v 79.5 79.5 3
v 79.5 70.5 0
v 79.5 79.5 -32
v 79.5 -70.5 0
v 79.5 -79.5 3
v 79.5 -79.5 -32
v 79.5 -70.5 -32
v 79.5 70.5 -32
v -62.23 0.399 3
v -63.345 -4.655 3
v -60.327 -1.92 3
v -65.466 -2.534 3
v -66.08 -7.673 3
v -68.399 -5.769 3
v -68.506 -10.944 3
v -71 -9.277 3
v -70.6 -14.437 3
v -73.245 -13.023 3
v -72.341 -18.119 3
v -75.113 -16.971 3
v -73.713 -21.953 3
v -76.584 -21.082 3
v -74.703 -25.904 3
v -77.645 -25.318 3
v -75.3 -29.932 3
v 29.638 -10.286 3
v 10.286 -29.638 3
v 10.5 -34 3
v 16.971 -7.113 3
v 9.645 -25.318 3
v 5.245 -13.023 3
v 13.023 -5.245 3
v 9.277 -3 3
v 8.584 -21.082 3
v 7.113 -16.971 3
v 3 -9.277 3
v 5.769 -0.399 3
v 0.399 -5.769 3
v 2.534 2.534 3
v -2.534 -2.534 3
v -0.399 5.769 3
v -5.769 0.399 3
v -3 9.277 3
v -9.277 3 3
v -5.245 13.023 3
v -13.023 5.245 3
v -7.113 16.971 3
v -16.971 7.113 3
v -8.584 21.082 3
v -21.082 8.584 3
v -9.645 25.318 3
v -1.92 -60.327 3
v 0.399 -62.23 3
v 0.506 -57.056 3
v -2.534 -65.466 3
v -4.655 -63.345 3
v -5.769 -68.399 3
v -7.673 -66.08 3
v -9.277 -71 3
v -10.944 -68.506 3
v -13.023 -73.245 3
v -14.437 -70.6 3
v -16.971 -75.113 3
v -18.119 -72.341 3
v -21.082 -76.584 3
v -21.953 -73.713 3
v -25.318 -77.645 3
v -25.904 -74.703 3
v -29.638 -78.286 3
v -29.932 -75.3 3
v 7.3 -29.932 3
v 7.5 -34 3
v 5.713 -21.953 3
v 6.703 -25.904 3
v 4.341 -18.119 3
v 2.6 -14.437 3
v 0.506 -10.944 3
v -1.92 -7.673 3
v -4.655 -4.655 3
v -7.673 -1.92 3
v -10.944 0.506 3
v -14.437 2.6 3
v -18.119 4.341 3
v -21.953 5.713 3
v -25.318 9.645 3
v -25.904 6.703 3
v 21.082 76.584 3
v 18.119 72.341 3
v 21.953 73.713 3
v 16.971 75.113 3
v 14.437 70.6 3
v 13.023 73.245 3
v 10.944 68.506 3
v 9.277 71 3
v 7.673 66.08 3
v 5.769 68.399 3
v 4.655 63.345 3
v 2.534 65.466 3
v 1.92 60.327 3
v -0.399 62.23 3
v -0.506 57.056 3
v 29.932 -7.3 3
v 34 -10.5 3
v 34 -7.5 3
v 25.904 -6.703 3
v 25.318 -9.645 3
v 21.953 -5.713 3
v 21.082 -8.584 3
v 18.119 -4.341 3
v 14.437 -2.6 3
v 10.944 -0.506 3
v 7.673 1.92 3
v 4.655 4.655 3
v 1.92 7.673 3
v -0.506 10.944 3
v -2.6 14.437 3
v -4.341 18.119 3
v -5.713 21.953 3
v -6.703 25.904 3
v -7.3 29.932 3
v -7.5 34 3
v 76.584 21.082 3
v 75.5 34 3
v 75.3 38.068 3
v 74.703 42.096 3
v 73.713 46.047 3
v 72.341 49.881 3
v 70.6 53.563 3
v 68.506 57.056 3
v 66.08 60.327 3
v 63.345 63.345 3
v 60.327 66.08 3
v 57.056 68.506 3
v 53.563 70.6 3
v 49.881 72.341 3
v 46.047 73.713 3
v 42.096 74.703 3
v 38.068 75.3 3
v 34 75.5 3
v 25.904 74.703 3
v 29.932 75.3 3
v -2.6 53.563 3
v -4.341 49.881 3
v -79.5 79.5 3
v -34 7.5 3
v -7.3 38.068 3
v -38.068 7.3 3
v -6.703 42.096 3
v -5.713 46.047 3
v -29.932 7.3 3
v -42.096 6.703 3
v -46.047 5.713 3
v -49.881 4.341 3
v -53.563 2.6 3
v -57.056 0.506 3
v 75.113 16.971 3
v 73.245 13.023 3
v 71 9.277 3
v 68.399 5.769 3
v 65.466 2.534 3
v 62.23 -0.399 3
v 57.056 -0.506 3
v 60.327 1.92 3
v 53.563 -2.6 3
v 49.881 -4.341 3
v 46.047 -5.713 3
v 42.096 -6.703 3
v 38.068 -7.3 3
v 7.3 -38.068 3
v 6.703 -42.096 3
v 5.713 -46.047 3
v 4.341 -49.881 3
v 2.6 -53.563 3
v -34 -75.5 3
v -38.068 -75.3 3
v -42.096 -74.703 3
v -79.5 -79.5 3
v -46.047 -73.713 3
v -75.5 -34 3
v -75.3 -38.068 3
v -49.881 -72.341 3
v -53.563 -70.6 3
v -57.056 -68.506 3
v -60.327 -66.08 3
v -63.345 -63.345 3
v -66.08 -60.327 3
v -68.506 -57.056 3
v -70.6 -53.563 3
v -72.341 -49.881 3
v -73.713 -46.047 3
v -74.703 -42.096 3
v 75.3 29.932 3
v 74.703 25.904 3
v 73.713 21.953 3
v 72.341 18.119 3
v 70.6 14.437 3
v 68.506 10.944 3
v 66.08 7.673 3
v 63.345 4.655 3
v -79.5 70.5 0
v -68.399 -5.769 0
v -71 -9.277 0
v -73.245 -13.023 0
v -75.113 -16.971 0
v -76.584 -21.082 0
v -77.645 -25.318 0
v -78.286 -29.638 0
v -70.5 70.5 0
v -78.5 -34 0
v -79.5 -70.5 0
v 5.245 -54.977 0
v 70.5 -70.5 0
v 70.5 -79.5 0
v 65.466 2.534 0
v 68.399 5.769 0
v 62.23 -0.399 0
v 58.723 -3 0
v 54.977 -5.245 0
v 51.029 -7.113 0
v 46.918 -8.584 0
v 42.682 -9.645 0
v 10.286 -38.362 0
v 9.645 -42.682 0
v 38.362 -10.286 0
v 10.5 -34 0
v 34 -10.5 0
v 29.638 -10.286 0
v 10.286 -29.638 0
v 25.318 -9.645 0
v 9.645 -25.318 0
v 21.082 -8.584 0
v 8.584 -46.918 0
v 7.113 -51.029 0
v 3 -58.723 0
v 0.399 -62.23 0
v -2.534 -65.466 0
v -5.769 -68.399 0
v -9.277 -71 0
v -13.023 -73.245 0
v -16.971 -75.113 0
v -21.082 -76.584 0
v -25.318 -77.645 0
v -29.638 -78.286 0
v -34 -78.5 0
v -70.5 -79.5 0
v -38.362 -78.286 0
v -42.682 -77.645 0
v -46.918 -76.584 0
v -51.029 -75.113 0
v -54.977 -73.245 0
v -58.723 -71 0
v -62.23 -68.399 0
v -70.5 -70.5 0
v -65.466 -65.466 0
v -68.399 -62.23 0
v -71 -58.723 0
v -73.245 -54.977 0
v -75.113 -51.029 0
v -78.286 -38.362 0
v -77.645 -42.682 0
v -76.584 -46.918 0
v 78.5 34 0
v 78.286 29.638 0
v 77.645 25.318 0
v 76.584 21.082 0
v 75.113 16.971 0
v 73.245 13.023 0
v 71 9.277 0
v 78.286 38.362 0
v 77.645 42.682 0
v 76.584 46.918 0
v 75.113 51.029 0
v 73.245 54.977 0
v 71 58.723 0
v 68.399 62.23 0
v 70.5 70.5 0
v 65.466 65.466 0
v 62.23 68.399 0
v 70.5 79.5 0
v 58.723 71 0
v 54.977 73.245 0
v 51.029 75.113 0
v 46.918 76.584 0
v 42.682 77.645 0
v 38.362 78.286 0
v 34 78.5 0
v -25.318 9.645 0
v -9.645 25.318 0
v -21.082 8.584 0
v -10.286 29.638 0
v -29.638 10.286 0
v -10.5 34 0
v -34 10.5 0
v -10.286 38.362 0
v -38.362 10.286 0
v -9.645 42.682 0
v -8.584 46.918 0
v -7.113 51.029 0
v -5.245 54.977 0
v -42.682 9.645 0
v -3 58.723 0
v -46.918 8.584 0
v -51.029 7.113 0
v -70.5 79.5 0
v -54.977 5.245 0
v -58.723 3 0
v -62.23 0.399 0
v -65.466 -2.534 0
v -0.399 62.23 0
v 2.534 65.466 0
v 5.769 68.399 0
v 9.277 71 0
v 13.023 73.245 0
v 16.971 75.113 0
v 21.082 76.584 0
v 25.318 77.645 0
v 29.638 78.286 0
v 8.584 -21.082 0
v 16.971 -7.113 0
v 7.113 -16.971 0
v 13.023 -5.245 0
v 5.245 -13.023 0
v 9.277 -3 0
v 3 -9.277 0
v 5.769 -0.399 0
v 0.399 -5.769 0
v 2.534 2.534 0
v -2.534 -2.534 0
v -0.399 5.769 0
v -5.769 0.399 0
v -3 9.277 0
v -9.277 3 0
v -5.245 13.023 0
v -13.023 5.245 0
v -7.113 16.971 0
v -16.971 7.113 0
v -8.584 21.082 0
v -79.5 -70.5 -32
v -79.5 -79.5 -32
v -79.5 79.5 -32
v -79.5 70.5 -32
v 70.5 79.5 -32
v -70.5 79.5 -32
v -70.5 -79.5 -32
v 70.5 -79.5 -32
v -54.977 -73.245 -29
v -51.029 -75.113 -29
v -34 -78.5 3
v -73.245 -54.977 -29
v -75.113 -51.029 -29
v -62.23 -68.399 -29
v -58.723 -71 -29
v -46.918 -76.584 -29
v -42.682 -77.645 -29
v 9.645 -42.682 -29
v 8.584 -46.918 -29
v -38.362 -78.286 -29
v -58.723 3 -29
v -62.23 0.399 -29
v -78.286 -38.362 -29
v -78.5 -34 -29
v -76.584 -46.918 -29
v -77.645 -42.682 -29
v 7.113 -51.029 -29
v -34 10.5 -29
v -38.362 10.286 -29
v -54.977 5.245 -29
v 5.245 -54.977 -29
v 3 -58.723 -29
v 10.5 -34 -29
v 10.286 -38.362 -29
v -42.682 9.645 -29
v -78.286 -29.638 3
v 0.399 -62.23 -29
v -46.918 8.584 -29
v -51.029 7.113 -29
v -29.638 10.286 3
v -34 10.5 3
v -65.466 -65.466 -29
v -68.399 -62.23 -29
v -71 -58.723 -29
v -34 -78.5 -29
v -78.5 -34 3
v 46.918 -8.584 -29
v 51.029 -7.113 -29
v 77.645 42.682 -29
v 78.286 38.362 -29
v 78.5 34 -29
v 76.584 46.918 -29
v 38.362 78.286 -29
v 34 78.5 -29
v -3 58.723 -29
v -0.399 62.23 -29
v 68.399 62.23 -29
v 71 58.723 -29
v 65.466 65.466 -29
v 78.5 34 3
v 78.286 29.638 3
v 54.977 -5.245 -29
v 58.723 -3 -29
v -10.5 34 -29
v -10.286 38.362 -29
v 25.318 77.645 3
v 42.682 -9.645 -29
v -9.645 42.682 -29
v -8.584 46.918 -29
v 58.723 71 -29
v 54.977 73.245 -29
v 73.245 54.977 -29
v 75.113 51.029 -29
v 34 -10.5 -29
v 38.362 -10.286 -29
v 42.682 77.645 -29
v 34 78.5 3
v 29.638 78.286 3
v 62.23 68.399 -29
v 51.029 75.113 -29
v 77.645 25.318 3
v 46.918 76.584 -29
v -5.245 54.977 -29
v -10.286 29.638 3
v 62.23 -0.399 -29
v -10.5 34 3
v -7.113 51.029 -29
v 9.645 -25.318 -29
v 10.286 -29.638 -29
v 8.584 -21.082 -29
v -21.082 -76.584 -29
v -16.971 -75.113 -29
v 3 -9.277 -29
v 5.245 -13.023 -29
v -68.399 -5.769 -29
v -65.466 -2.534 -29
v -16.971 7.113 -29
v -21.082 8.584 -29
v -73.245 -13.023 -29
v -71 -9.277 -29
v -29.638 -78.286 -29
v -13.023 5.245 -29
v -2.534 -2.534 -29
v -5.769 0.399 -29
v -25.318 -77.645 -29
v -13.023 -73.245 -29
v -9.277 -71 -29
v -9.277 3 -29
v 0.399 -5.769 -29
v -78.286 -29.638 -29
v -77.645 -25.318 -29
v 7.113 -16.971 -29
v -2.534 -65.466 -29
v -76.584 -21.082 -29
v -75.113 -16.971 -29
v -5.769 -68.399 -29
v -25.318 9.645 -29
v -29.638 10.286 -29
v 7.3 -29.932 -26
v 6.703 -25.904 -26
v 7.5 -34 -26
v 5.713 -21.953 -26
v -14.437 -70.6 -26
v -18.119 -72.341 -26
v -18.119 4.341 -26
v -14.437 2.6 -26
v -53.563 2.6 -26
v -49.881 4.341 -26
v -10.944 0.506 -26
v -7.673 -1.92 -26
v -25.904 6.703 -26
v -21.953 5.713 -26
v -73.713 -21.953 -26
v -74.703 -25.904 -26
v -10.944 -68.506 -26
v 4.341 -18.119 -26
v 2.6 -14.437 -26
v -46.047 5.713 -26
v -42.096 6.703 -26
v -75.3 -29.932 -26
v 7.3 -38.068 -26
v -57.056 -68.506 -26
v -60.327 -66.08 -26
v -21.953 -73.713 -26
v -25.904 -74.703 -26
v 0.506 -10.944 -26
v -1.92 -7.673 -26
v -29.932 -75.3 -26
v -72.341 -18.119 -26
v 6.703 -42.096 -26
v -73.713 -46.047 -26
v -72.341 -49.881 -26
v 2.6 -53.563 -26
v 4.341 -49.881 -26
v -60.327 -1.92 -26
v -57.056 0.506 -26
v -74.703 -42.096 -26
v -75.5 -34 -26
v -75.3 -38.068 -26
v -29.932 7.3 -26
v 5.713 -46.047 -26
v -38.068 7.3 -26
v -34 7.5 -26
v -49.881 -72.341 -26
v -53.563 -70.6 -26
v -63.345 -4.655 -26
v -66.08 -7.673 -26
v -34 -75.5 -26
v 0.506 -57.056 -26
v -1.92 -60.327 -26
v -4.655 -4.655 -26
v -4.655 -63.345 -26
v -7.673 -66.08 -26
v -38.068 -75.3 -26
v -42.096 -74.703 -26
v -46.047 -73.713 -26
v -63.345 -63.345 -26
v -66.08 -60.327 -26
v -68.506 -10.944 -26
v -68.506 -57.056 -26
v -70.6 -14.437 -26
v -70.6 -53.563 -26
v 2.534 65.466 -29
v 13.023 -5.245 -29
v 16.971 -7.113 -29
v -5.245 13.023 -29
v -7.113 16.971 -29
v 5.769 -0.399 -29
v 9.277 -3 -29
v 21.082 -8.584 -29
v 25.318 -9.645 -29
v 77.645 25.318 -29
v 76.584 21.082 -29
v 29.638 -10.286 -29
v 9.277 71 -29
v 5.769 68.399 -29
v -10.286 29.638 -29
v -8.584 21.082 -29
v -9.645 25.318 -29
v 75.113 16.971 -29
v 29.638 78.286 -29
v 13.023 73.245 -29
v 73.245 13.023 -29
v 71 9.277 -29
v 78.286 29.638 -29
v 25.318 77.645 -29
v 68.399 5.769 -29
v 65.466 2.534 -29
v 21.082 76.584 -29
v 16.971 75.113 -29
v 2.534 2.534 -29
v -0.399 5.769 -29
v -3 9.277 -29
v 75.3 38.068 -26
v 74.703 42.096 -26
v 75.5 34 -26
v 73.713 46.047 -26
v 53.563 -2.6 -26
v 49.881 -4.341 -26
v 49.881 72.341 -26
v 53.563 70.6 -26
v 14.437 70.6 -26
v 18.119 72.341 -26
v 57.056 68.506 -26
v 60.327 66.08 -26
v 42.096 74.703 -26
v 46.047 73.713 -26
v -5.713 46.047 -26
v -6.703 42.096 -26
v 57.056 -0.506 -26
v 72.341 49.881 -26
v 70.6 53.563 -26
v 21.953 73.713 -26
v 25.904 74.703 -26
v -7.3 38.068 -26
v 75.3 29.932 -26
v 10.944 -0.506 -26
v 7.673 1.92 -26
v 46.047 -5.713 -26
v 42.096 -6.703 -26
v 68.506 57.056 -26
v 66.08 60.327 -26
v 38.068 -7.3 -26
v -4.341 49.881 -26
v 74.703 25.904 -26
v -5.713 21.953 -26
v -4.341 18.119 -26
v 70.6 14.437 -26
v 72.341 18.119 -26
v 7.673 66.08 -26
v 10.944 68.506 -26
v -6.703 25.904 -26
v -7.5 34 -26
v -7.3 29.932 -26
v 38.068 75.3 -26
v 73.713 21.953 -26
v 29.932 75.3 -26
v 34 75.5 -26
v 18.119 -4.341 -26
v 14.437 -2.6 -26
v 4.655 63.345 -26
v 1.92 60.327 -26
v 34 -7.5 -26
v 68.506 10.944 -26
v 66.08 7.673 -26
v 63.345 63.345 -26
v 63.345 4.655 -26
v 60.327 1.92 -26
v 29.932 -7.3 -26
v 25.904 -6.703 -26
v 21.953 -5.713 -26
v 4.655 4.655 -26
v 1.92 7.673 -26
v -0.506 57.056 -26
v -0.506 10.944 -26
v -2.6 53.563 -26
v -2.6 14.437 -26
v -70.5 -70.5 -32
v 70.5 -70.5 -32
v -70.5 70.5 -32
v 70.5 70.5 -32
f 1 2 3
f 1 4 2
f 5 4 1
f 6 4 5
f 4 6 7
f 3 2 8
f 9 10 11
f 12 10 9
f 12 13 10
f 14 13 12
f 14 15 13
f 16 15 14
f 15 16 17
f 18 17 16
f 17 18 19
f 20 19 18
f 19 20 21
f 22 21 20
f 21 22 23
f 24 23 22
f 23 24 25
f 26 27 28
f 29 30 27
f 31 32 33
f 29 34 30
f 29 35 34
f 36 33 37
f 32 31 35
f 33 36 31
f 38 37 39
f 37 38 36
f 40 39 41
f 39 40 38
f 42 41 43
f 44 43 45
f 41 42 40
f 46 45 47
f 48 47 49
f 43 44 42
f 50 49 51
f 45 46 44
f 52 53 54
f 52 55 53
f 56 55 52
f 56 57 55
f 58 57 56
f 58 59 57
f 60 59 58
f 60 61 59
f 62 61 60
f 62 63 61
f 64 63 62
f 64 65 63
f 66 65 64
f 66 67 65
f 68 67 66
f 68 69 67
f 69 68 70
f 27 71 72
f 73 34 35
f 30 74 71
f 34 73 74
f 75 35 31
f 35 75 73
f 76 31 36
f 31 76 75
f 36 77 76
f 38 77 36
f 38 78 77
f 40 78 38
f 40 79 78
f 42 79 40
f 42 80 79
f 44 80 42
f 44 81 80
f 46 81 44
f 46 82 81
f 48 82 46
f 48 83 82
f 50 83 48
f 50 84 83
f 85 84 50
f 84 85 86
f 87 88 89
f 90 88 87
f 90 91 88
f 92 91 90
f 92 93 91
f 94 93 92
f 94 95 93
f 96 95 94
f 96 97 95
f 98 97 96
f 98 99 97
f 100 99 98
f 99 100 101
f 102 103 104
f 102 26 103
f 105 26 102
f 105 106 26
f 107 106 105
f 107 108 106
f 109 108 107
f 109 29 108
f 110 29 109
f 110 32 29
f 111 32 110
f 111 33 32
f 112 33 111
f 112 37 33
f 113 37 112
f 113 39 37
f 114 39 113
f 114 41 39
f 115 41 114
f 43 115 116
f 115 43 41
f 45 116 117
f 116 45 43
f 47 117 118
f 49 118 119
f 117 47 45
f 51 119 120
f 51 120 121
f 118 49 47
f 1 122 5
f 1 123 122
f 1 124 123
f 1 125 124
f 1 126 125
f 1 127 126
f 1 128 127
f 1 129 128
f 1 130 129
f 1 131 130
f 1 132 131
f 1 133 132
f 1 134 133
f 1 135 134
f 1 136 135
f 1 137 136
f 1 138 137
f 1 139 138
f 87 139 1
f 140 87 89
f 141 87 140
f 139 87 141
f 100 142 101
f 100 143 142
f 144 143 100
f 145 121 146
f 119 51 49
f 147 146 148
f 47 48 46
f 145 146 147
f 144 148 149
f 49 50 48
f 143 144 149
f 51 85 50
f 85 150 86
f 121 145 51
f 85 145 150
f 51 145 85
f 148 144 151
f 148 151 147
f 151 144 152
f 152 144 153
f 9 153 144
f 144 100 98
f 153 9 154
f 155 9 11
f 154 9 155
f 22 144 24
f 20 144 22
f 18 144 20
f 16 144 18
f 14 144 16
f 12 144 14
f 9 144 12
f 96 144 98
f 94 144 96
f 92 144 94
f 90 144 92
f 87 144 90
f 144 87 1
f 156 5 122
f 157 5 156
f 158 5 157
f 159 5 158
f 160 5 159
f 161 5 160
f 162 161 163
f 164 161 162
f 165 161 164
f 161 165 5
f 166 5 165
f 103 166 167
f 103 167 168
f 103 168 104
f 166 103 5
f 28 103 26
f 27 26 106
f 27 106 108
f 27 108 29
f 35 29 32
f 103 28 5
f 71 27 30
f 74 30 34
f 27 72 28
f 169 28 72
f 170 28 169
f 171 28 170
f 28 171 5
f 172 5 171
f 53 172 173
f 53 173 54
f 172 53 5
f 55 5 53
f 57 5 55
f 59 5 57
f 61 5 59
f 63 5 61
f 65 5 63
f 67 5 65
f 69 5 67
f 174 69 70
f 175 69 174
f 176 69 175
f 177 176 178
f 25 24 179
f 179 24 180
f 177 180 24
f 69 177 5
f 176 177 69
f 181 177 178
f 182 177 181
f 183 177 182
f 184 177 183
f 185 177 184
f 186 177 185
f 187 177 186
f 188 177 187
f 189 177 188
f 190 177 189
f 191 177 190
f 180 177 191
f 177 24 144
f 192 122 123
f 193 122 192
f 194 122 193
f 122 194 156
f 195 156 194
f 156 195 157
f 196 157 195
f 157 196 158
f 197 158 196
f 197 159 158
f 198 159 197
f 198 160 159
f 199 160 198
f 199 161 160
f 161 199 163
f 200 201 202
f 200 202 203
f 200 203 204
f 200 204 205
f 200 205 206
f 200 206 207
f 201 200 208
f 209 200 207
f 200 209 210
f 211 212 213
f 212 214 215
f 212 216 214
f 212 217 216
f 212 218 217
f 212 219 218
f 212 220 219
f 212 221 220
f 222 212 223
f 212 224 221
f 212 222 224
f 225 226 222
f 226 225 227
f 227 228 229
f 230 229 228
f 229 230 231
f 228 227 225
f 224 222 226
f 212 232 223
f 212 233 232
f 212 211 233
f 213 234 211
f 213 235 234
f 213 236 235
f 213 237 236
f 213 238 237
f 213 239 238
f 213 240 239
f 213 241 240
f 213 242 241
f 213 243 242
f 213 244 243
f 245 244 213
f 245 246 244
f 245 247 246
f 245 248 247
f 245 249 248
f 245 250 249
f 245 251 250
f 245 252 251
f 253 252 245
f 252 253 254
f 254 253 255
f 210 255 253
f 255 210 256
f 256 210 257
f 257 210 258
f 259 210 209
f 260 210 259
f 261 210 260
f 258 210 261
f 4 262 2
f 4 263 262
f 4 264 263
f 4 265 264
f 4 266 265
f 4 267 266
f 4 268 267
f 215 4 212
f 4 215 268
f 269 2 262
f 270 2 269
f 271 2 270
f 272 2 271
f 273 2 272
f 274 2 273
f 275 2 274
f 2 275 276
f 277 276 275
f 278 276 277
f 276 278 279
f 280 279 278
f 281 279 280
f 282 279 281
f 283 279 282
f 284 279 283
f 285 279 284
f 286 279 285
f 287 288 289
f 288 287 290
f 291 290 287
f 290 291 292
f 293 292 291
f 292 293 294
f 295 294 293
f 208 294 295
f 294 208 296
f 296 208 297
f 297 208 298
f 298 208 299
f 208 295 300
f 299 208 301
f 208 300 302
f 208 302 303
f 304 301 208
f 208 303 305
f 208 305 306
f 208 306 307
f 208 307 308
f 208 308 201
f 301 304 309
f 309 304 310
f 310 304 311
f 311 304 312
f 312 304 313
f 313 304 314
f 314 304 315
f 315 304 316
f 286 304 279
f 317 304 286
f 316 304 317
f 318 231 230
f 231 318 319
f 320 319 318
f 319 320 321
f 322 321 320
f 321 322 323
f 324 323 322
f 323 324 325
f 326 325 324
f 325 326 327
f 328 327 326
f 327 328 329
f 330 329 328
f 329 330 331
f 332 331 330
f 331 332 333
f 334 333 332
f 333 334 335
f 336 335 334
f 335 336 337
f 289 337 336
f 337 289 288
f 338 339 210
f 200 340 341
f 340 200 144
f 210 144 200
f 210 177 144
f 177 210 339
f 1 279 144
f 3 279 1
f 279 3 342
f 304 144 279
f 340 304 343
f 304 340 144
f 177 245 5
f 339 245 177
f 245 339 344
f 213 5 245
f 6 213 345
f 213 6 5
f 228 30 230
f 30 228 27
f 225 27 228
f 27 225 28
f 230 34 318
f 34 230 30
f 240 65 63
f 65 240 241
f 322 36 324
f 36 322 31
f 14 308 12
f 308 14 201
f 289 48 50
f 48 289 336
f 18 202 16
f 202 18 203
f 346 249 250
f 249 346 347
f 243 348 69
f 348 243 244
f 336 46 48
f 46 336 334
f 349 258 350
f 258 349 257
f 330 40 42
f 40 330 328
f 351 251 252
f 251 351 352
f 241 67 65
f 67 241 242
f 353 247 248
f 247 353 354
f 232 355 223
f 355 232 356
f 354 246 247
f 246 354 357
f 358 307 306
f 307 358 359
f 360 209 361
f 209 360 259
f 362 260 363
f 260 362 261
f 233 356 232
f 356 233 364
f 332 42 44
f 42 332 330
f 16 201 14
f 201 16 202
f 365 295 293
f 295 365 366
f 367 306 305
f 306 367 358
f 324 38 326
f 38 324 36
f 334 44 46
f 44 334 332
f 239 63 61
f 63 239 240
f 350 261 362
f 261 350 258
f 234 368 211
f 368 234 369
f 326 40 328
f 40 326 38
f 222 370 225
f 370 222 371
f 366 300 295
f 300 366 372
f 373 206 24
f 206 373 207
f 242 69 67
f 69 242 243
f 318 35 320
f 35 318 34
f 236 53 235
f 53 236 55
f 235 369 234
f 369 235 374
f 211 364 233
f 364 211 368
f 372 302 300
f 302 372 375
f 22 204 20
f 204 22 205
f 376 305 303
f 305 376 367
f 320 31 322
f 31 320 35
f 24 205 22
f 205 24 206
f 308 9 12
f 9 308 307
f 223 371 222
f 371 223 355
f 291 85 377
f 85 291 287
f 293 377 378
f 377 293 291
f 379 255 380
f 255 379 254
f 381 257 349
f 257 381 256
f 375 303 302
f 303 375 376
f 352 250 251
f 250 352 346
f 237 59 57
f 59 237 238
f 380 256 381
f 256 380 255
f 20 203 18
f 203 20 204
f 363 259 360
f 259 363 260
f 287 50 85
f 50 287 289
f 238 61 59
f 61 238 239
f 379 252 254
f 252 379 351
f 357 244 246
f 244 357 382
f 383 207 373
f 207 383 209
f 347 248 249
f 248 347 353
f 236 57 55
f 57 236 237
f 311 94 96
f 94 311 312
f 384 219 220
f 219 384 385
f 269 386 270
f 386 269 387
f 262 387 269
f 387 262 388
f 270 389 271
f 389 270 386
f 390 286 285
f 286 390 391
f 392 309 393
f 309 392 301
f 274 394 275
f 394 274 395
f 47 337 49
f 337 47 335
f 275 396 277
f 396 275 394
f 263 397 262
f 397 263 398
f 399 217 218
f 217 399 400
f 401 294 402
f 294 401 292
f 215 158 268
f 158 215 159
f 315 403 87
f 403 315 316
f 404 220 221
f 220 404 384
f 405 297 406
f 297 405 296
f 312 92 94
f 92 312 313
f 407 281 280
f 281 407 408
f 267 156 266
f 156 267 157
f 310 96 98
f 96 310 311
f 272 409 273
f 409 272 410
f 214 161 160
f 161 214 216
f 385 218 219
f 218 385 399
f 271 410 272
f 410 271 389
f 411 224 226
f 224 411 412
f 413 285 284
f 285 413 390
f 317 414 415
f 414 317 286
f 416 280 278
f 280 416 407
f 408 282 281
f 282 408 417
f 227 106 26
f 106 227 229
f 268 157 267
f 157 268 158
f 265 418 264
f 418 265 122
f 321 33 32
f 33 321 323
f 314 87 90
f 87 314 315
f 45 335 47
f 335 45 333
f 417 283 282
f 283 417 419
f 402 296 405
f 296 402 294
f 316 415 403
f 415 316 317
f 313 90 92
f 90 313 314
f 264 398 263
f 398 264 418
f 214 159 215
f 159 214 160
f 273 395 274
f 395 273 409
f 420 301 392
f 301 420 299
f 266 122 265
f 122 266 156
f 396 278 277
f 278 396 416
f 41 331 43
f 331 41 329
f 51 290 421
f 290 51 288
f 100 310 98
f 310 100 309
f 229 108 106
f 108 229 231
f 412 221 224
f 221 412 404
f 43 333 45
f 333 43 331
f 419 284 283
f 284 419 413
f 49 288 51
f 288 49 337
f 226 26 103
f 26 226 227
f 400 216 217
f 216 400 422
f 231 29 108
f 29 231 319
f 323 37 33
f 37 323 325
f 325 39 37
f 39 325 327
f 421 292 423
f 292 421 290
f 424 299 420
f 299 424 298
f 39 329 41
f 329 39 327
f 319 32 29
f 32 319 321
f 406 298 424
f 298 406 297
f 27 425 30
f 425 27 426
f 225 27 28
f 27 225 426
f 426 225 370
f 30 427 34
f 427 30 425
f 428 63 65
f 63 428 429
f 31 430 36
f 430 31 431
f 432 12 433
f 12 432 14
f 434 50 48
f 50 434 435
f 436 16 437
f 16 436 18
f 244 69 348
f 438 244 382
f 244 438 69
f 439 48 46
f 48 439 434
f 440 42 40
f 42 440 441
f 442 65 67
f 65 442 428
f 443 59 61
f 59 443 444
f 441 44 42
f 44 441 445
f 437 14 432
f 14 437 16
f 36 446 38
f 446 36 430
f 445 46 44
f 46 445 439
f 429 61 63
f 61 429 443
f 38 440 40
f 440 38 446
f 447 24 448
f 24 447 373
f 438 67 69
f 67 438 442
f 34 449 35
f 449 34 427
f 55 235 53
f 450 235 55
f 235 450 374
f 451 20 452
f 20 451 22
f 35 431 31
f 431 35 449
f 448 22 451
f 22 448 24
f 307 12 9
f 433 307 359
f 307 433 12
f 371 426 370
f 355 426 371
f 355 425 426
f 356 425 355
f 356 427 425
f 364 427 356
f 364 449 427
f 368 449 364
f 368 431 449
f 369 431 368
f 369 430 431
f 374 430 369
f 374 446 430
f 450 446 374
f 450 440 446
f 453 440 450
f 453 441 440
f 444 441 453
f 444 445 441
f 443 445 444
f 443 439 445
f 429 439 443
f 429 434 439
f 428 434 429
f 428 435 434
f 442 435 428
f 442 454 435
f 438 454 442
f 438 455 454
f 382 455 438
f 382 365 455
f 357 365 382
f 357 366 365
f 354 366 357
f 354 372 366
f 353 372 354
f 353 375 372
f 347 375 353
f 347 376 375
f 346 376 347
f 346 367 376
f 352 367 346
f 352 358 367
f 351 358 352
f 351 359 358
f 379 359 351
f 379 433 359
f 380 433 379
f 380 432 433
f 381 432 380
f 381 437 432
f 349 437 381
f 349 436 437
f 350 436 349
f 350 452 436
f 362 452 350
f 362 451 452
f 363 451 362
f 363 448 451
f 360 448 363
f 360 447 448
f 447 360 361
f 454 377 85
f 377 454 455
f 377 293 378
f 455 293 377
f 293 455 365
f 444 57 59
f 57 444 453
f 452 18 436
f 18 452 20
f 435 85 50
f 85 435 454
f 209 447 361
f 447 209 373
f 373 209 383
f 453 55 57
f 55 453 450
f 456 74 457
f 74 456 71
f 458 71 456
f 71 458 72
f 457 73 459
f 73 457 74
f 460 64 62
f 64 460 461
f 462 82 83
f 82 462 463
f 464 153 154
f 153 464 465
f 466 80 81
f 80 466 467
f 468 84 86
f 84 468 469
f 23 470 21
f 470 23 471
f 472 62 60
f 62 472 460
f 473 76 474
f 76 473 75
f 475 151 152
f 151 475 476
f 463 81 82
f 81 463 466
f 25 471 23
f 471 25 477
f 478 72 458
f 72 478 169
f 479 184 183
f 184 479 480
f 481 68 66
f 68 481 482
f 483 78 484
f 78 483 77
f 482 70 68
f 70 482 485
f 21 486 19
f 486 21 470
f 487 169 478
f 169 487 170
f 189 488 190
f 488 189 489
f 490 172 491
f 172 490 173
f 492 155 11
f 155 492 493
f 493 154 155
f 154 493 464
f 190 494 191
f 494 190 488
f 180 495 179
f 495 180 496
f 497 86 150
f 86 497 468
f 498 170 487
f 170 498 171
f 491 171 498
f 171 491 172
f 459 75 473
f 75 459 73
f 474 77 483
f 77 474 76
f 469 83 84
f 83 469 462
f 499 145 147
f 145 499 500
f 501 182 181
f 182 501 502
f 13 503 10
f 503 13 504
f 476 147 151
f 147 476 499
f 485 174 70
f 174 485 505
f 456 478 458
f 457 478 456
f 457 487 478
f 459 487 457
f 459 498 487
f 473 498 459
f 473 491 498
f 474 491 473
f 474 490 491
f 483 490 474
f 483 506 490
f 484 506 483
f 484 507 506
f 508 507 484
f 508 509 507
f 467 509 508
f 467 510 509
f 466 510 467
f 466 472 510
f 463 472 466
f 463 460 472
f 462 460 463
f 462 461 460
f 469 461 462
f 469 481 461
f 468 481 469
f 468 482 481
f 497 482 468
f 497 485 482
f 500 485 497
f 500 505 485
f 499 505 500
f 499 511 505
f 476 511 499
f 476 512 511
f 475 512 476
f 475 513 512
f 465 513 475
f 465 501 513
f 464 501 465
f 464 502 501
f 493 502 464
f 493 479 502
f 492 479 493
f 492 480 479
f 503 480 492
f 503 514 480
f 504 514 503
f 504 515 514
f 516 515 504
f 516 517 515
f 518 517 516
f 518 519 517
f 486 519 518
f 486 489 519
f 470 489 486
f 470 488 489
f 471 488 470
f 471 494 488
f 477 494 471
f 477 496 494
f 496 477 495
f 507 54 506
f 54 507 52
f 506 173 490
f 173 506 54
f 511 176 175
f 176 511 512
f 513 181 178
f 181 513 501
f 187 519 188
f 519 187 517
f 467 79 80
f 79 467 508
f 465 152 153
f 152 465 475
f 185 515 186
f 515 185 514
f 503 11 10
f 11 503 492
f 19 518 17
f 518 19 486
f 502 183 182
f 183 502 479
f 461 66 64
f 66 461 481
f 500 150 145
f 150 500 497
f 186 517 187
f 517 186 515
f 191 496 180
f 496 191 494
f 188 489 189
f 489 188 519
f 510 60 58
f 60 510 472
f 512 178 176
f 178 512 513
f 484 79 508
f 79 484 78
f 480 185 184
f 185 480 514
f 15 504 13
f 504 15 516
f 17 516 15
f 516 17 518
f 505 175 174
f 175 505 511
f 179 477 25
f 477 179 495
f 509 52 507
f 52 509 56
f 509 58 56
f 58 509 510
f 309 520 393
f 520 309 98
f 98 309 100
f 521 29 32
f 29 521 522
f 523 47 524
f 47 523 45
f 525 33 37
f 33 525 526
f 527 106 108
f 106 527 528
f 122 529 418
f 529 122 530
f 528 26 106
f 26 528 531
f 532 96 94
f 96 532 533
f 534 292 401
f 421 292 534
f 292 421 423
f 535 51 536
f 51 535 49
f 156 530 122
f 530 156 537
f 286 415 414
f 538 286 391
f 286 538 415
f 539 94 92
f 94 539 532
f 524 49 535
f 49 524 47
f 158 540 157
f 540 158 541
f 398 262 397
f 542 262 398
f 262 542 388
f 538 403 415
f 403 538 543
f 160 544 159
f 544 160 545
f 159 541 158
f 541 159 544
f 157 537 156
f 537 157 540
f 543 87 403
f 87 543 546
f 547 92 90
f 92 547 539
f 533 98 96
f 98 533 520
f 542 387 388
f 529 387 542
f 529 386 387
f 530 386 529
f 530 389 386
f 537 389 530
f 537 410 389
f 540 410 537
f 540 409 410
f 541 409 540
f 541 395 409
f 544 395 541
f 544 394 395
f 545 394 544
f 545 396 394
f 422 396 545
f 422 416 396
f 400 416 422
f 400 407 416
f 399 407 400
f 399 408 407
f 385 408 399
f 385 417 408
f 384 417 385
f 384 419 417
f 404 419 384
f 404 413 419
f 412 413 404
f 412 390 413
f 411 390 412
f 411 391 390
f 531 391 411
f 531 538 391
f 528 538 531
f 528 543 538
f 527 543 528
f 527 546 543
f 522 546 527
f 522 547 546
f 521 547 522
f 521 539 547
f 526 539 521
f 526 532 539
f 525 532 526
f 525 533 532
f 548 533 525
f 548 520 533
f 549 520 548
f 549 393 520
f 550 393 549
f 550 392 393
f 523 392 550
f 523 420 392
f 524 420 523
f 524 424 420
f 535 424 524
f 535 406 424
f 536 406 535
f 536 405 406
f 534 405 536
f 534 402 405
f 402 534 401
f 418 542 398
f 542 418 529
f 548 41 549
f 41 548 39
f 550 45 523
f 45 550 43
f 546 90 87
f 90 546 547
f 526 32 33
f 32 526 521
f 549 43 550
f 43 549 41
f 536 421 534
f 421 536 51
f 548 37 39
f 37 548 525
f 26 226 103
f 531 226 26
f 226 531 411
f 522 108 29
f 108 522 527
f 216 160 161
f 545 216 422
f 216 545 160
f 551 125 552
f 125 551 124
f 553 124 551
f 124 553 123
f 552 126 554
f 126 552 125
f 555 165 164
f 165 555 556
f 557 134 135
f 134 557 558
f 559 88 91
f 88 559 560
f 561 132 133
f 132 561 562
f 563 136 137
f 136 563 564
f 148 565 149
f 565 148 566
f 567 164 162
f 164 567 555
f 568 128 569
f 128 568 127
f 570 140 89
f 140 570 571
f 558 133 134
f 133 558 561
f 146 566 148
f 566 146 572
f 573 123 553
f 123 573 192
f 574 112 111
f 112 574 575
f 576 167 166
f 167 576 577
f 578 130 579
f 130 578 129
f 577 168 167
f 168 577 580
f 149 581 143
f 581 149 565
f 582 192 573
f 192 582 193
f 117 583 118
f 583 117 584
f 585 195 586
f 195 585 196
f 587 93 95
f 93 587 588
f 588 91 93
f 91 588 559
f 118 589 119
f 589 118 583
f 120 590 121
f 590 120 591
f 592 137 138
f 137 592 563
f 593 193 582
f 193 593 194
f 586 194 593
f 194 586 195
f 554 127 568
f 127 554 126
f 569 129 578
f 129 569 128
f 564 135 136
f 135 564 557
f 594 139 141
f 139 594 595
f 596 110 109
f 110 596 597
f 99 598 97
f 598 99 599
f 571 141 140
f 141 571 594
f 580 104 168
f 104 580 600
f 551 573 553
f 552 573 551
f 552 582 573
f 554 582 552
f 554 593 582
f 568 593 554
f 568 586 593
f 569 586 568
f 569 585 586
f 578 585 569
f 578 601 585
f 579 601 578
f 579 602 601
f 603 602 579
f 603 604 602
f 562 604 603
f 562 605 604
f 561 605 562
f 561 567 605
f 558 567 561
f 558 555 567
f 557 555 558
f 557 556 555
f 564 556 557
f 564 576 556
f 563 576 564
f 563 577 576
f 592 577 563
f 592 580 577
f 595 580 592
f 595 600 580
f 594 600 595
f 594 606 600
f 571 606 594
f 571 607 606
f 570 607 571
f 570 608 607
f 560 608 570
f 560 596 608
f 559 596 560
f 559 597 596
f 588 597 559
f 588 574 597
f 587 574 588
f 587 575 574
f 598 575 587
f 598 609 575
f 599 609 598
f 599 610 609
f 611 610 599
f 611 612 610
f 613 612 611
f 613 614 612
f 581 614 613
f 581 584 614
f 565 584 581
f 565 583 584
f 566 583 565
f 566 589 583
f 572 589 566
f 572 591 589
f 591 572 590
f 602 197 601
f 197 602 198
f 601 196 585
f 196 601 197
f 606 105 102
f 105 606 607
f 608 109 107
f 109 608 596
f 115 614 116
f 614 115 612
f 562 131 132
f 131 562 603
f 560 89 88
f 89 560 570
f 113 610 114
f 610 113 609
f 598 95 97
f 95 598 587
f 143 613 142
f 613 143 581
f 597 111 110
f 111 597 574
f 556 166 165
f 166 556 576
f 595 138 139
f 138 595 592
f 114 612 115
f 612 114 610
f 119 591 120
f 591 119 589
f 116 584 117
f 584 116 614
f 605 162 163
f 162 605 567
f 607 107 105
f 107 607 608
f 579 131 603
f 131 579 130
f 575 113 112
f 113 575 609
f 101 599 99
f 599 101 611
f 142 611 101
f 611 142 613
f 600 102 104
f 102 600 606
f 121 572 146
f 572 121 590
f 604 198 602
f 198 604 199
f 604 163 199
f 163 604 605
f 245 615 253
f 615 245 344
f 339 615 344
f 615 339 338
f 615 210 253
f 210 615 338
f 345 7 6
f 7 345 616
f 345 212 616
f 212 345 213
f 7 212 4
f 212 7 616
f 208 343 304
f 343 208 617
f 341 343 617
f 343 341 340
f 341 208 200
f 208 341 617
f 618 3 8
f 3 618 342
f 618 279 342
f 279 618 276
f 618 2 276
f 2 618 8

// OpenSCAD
// ============================================================
// Parametrische Lochplatte mit Eckstützen und Zylindern
// ============================================================
// Aufbau:
//   z = +platten_dicke  → Oberkante Platte = Öffnung Zylinder
//   z =  0              → Unterkante Platte
//   z = -stuetzen_hoehe → Unterkante Stützen
// ============================================================

// --- Parameter (anpassbar) ---
laenge          =  159; // Länge der Grundplatte in mm
breite          =  159;   // Breite der Grundplatte in mm
stuetzen_hoehe  =   32;   // Höhe der Eckstützen in mm
bohrung_dm      =   83;   // Innendurchmesser der Zylinder in mm
zylinder_tiefe  =   32;   // Tiefe der Zylinder in mm (max = stuetzen_hoehe!)
mit_stuetzen    = true;  // true = Stützen an / false = Stützen aus

// --- Konstanten ---
platten_dicke   =  3;    // Dicke der Grundplatte in mm
stuetzen_breite =  9;    // Querschnitt der quadratischen Stützen in mm
randabstand     =  4;   // Mindestabstand Bohrungsrand → Plattenrand in mm
wandstaerke     =  3;    // Wandstärke der Zylinder in mm

// --- Kreisauflösung ---
$fn = 64;

// --- Sicherheit: Zylinder nie tiefer als Stützen ---
eff_tiefe = min(zylinder_tiefe, stuetzen_hoehe);

// ============================================================
// Berechnete Hilfswerte
//
//   rand_mitte = randabstand + bohrung_dm/2
//   → Abstand Bohrungsmitte zum Plattenrand
//
//   Diagonale Platzierung:
//   Bohrung 1: vorne-links  (-x, -y)
//   Bohrung 2: hinten-rechts (+x, +y)
// ============================================================
rand_mitte = randabstand + bohrung_dm / 2;
pos_x      = laenge/2 - rand_mitte;   // X-Abstand vom Zentrum
pos_y      = breite/2 - rand_mitte;   // Y-Abstand vom Zentrum
aussen_dm  = bohrung_dm + 2 * wandstaerke;

// ============================================================
// Modul: Grundplatte mit 2 diagonalen Ausschnitten
// ============================================================
module grundplatte() {
    difference() {
        translate([-laenge/2, -breite/2, 0])
            cube([laenge, breite, platten_dicke]);

        // Bohrung 1 – vorne links
        translate([-pos_x, -pos_y, -0.1])
            cylinder(h = platten_dicke + 0.2, d = aussen_dm);

        // Bohrung 2 – hinten rechts
        translate([+pos_x, +pos_y, -0.1])
            cylinder(h = platten_dicke + 0.2, d = aussen_dm);
    }
}

// ============================================================
// Modul: Ein einzelner Zylinder (hängt unter der Platte)
// ============================================================
module zylinder_einzel(px, py) {
    translate([px, py, platten_dicke - eff_tiefe])
        difference() {
            cylinder(h = eff_tiefe, d = aussen_dm);
            translate([0, 0, wandstaerke])
                cylinder(h = eff_tiefe, d = bohrung_dm);
        }
}

// ============================================================
// Modul: Beide Zylinder diagonal
// ============================================================
module zylinder_diagonal() {
    zylinder_einzel(-pos_x, -pos_y);  // vorne links
    zylinder_einzel(+pos_x, +pos_y);  // hinten rechts
}

// ============================================================
// Modul: Eine einzelne Eckstütze
// ============================================================
module stuetze() {
    cube([stuetzen_breite, stuetzen_breite, stuetzen_hoehe]);
}

// ============================================================
// Modul: Alle vier Eckstützen unter der Grundplatte
// ============================================================
module eckstuetzen() {
    x = laenge/2 - stuetzen_breite;
    y = breite/2  - stuetzen_breite;

    translate([-laenge/2, -breite/2, -stuetzen_hoehe]) stuetze();
    translate([ x,        -breite/2, -stuetzen_hoehe]) stuetze();
    translate([-laenge/2,  y,        -stuetzen_hoehe]) stuetze();
    translate([ x,         y,        -stuetzen_hoehe]) stuetze();
}

// ============================================================
// Zusammenbau
// ============================================================
union() {
    grundplatte();
    zylinder_diagonal();
    if (mit_stuetzen) {
        eckstuetzen();
    }
}
